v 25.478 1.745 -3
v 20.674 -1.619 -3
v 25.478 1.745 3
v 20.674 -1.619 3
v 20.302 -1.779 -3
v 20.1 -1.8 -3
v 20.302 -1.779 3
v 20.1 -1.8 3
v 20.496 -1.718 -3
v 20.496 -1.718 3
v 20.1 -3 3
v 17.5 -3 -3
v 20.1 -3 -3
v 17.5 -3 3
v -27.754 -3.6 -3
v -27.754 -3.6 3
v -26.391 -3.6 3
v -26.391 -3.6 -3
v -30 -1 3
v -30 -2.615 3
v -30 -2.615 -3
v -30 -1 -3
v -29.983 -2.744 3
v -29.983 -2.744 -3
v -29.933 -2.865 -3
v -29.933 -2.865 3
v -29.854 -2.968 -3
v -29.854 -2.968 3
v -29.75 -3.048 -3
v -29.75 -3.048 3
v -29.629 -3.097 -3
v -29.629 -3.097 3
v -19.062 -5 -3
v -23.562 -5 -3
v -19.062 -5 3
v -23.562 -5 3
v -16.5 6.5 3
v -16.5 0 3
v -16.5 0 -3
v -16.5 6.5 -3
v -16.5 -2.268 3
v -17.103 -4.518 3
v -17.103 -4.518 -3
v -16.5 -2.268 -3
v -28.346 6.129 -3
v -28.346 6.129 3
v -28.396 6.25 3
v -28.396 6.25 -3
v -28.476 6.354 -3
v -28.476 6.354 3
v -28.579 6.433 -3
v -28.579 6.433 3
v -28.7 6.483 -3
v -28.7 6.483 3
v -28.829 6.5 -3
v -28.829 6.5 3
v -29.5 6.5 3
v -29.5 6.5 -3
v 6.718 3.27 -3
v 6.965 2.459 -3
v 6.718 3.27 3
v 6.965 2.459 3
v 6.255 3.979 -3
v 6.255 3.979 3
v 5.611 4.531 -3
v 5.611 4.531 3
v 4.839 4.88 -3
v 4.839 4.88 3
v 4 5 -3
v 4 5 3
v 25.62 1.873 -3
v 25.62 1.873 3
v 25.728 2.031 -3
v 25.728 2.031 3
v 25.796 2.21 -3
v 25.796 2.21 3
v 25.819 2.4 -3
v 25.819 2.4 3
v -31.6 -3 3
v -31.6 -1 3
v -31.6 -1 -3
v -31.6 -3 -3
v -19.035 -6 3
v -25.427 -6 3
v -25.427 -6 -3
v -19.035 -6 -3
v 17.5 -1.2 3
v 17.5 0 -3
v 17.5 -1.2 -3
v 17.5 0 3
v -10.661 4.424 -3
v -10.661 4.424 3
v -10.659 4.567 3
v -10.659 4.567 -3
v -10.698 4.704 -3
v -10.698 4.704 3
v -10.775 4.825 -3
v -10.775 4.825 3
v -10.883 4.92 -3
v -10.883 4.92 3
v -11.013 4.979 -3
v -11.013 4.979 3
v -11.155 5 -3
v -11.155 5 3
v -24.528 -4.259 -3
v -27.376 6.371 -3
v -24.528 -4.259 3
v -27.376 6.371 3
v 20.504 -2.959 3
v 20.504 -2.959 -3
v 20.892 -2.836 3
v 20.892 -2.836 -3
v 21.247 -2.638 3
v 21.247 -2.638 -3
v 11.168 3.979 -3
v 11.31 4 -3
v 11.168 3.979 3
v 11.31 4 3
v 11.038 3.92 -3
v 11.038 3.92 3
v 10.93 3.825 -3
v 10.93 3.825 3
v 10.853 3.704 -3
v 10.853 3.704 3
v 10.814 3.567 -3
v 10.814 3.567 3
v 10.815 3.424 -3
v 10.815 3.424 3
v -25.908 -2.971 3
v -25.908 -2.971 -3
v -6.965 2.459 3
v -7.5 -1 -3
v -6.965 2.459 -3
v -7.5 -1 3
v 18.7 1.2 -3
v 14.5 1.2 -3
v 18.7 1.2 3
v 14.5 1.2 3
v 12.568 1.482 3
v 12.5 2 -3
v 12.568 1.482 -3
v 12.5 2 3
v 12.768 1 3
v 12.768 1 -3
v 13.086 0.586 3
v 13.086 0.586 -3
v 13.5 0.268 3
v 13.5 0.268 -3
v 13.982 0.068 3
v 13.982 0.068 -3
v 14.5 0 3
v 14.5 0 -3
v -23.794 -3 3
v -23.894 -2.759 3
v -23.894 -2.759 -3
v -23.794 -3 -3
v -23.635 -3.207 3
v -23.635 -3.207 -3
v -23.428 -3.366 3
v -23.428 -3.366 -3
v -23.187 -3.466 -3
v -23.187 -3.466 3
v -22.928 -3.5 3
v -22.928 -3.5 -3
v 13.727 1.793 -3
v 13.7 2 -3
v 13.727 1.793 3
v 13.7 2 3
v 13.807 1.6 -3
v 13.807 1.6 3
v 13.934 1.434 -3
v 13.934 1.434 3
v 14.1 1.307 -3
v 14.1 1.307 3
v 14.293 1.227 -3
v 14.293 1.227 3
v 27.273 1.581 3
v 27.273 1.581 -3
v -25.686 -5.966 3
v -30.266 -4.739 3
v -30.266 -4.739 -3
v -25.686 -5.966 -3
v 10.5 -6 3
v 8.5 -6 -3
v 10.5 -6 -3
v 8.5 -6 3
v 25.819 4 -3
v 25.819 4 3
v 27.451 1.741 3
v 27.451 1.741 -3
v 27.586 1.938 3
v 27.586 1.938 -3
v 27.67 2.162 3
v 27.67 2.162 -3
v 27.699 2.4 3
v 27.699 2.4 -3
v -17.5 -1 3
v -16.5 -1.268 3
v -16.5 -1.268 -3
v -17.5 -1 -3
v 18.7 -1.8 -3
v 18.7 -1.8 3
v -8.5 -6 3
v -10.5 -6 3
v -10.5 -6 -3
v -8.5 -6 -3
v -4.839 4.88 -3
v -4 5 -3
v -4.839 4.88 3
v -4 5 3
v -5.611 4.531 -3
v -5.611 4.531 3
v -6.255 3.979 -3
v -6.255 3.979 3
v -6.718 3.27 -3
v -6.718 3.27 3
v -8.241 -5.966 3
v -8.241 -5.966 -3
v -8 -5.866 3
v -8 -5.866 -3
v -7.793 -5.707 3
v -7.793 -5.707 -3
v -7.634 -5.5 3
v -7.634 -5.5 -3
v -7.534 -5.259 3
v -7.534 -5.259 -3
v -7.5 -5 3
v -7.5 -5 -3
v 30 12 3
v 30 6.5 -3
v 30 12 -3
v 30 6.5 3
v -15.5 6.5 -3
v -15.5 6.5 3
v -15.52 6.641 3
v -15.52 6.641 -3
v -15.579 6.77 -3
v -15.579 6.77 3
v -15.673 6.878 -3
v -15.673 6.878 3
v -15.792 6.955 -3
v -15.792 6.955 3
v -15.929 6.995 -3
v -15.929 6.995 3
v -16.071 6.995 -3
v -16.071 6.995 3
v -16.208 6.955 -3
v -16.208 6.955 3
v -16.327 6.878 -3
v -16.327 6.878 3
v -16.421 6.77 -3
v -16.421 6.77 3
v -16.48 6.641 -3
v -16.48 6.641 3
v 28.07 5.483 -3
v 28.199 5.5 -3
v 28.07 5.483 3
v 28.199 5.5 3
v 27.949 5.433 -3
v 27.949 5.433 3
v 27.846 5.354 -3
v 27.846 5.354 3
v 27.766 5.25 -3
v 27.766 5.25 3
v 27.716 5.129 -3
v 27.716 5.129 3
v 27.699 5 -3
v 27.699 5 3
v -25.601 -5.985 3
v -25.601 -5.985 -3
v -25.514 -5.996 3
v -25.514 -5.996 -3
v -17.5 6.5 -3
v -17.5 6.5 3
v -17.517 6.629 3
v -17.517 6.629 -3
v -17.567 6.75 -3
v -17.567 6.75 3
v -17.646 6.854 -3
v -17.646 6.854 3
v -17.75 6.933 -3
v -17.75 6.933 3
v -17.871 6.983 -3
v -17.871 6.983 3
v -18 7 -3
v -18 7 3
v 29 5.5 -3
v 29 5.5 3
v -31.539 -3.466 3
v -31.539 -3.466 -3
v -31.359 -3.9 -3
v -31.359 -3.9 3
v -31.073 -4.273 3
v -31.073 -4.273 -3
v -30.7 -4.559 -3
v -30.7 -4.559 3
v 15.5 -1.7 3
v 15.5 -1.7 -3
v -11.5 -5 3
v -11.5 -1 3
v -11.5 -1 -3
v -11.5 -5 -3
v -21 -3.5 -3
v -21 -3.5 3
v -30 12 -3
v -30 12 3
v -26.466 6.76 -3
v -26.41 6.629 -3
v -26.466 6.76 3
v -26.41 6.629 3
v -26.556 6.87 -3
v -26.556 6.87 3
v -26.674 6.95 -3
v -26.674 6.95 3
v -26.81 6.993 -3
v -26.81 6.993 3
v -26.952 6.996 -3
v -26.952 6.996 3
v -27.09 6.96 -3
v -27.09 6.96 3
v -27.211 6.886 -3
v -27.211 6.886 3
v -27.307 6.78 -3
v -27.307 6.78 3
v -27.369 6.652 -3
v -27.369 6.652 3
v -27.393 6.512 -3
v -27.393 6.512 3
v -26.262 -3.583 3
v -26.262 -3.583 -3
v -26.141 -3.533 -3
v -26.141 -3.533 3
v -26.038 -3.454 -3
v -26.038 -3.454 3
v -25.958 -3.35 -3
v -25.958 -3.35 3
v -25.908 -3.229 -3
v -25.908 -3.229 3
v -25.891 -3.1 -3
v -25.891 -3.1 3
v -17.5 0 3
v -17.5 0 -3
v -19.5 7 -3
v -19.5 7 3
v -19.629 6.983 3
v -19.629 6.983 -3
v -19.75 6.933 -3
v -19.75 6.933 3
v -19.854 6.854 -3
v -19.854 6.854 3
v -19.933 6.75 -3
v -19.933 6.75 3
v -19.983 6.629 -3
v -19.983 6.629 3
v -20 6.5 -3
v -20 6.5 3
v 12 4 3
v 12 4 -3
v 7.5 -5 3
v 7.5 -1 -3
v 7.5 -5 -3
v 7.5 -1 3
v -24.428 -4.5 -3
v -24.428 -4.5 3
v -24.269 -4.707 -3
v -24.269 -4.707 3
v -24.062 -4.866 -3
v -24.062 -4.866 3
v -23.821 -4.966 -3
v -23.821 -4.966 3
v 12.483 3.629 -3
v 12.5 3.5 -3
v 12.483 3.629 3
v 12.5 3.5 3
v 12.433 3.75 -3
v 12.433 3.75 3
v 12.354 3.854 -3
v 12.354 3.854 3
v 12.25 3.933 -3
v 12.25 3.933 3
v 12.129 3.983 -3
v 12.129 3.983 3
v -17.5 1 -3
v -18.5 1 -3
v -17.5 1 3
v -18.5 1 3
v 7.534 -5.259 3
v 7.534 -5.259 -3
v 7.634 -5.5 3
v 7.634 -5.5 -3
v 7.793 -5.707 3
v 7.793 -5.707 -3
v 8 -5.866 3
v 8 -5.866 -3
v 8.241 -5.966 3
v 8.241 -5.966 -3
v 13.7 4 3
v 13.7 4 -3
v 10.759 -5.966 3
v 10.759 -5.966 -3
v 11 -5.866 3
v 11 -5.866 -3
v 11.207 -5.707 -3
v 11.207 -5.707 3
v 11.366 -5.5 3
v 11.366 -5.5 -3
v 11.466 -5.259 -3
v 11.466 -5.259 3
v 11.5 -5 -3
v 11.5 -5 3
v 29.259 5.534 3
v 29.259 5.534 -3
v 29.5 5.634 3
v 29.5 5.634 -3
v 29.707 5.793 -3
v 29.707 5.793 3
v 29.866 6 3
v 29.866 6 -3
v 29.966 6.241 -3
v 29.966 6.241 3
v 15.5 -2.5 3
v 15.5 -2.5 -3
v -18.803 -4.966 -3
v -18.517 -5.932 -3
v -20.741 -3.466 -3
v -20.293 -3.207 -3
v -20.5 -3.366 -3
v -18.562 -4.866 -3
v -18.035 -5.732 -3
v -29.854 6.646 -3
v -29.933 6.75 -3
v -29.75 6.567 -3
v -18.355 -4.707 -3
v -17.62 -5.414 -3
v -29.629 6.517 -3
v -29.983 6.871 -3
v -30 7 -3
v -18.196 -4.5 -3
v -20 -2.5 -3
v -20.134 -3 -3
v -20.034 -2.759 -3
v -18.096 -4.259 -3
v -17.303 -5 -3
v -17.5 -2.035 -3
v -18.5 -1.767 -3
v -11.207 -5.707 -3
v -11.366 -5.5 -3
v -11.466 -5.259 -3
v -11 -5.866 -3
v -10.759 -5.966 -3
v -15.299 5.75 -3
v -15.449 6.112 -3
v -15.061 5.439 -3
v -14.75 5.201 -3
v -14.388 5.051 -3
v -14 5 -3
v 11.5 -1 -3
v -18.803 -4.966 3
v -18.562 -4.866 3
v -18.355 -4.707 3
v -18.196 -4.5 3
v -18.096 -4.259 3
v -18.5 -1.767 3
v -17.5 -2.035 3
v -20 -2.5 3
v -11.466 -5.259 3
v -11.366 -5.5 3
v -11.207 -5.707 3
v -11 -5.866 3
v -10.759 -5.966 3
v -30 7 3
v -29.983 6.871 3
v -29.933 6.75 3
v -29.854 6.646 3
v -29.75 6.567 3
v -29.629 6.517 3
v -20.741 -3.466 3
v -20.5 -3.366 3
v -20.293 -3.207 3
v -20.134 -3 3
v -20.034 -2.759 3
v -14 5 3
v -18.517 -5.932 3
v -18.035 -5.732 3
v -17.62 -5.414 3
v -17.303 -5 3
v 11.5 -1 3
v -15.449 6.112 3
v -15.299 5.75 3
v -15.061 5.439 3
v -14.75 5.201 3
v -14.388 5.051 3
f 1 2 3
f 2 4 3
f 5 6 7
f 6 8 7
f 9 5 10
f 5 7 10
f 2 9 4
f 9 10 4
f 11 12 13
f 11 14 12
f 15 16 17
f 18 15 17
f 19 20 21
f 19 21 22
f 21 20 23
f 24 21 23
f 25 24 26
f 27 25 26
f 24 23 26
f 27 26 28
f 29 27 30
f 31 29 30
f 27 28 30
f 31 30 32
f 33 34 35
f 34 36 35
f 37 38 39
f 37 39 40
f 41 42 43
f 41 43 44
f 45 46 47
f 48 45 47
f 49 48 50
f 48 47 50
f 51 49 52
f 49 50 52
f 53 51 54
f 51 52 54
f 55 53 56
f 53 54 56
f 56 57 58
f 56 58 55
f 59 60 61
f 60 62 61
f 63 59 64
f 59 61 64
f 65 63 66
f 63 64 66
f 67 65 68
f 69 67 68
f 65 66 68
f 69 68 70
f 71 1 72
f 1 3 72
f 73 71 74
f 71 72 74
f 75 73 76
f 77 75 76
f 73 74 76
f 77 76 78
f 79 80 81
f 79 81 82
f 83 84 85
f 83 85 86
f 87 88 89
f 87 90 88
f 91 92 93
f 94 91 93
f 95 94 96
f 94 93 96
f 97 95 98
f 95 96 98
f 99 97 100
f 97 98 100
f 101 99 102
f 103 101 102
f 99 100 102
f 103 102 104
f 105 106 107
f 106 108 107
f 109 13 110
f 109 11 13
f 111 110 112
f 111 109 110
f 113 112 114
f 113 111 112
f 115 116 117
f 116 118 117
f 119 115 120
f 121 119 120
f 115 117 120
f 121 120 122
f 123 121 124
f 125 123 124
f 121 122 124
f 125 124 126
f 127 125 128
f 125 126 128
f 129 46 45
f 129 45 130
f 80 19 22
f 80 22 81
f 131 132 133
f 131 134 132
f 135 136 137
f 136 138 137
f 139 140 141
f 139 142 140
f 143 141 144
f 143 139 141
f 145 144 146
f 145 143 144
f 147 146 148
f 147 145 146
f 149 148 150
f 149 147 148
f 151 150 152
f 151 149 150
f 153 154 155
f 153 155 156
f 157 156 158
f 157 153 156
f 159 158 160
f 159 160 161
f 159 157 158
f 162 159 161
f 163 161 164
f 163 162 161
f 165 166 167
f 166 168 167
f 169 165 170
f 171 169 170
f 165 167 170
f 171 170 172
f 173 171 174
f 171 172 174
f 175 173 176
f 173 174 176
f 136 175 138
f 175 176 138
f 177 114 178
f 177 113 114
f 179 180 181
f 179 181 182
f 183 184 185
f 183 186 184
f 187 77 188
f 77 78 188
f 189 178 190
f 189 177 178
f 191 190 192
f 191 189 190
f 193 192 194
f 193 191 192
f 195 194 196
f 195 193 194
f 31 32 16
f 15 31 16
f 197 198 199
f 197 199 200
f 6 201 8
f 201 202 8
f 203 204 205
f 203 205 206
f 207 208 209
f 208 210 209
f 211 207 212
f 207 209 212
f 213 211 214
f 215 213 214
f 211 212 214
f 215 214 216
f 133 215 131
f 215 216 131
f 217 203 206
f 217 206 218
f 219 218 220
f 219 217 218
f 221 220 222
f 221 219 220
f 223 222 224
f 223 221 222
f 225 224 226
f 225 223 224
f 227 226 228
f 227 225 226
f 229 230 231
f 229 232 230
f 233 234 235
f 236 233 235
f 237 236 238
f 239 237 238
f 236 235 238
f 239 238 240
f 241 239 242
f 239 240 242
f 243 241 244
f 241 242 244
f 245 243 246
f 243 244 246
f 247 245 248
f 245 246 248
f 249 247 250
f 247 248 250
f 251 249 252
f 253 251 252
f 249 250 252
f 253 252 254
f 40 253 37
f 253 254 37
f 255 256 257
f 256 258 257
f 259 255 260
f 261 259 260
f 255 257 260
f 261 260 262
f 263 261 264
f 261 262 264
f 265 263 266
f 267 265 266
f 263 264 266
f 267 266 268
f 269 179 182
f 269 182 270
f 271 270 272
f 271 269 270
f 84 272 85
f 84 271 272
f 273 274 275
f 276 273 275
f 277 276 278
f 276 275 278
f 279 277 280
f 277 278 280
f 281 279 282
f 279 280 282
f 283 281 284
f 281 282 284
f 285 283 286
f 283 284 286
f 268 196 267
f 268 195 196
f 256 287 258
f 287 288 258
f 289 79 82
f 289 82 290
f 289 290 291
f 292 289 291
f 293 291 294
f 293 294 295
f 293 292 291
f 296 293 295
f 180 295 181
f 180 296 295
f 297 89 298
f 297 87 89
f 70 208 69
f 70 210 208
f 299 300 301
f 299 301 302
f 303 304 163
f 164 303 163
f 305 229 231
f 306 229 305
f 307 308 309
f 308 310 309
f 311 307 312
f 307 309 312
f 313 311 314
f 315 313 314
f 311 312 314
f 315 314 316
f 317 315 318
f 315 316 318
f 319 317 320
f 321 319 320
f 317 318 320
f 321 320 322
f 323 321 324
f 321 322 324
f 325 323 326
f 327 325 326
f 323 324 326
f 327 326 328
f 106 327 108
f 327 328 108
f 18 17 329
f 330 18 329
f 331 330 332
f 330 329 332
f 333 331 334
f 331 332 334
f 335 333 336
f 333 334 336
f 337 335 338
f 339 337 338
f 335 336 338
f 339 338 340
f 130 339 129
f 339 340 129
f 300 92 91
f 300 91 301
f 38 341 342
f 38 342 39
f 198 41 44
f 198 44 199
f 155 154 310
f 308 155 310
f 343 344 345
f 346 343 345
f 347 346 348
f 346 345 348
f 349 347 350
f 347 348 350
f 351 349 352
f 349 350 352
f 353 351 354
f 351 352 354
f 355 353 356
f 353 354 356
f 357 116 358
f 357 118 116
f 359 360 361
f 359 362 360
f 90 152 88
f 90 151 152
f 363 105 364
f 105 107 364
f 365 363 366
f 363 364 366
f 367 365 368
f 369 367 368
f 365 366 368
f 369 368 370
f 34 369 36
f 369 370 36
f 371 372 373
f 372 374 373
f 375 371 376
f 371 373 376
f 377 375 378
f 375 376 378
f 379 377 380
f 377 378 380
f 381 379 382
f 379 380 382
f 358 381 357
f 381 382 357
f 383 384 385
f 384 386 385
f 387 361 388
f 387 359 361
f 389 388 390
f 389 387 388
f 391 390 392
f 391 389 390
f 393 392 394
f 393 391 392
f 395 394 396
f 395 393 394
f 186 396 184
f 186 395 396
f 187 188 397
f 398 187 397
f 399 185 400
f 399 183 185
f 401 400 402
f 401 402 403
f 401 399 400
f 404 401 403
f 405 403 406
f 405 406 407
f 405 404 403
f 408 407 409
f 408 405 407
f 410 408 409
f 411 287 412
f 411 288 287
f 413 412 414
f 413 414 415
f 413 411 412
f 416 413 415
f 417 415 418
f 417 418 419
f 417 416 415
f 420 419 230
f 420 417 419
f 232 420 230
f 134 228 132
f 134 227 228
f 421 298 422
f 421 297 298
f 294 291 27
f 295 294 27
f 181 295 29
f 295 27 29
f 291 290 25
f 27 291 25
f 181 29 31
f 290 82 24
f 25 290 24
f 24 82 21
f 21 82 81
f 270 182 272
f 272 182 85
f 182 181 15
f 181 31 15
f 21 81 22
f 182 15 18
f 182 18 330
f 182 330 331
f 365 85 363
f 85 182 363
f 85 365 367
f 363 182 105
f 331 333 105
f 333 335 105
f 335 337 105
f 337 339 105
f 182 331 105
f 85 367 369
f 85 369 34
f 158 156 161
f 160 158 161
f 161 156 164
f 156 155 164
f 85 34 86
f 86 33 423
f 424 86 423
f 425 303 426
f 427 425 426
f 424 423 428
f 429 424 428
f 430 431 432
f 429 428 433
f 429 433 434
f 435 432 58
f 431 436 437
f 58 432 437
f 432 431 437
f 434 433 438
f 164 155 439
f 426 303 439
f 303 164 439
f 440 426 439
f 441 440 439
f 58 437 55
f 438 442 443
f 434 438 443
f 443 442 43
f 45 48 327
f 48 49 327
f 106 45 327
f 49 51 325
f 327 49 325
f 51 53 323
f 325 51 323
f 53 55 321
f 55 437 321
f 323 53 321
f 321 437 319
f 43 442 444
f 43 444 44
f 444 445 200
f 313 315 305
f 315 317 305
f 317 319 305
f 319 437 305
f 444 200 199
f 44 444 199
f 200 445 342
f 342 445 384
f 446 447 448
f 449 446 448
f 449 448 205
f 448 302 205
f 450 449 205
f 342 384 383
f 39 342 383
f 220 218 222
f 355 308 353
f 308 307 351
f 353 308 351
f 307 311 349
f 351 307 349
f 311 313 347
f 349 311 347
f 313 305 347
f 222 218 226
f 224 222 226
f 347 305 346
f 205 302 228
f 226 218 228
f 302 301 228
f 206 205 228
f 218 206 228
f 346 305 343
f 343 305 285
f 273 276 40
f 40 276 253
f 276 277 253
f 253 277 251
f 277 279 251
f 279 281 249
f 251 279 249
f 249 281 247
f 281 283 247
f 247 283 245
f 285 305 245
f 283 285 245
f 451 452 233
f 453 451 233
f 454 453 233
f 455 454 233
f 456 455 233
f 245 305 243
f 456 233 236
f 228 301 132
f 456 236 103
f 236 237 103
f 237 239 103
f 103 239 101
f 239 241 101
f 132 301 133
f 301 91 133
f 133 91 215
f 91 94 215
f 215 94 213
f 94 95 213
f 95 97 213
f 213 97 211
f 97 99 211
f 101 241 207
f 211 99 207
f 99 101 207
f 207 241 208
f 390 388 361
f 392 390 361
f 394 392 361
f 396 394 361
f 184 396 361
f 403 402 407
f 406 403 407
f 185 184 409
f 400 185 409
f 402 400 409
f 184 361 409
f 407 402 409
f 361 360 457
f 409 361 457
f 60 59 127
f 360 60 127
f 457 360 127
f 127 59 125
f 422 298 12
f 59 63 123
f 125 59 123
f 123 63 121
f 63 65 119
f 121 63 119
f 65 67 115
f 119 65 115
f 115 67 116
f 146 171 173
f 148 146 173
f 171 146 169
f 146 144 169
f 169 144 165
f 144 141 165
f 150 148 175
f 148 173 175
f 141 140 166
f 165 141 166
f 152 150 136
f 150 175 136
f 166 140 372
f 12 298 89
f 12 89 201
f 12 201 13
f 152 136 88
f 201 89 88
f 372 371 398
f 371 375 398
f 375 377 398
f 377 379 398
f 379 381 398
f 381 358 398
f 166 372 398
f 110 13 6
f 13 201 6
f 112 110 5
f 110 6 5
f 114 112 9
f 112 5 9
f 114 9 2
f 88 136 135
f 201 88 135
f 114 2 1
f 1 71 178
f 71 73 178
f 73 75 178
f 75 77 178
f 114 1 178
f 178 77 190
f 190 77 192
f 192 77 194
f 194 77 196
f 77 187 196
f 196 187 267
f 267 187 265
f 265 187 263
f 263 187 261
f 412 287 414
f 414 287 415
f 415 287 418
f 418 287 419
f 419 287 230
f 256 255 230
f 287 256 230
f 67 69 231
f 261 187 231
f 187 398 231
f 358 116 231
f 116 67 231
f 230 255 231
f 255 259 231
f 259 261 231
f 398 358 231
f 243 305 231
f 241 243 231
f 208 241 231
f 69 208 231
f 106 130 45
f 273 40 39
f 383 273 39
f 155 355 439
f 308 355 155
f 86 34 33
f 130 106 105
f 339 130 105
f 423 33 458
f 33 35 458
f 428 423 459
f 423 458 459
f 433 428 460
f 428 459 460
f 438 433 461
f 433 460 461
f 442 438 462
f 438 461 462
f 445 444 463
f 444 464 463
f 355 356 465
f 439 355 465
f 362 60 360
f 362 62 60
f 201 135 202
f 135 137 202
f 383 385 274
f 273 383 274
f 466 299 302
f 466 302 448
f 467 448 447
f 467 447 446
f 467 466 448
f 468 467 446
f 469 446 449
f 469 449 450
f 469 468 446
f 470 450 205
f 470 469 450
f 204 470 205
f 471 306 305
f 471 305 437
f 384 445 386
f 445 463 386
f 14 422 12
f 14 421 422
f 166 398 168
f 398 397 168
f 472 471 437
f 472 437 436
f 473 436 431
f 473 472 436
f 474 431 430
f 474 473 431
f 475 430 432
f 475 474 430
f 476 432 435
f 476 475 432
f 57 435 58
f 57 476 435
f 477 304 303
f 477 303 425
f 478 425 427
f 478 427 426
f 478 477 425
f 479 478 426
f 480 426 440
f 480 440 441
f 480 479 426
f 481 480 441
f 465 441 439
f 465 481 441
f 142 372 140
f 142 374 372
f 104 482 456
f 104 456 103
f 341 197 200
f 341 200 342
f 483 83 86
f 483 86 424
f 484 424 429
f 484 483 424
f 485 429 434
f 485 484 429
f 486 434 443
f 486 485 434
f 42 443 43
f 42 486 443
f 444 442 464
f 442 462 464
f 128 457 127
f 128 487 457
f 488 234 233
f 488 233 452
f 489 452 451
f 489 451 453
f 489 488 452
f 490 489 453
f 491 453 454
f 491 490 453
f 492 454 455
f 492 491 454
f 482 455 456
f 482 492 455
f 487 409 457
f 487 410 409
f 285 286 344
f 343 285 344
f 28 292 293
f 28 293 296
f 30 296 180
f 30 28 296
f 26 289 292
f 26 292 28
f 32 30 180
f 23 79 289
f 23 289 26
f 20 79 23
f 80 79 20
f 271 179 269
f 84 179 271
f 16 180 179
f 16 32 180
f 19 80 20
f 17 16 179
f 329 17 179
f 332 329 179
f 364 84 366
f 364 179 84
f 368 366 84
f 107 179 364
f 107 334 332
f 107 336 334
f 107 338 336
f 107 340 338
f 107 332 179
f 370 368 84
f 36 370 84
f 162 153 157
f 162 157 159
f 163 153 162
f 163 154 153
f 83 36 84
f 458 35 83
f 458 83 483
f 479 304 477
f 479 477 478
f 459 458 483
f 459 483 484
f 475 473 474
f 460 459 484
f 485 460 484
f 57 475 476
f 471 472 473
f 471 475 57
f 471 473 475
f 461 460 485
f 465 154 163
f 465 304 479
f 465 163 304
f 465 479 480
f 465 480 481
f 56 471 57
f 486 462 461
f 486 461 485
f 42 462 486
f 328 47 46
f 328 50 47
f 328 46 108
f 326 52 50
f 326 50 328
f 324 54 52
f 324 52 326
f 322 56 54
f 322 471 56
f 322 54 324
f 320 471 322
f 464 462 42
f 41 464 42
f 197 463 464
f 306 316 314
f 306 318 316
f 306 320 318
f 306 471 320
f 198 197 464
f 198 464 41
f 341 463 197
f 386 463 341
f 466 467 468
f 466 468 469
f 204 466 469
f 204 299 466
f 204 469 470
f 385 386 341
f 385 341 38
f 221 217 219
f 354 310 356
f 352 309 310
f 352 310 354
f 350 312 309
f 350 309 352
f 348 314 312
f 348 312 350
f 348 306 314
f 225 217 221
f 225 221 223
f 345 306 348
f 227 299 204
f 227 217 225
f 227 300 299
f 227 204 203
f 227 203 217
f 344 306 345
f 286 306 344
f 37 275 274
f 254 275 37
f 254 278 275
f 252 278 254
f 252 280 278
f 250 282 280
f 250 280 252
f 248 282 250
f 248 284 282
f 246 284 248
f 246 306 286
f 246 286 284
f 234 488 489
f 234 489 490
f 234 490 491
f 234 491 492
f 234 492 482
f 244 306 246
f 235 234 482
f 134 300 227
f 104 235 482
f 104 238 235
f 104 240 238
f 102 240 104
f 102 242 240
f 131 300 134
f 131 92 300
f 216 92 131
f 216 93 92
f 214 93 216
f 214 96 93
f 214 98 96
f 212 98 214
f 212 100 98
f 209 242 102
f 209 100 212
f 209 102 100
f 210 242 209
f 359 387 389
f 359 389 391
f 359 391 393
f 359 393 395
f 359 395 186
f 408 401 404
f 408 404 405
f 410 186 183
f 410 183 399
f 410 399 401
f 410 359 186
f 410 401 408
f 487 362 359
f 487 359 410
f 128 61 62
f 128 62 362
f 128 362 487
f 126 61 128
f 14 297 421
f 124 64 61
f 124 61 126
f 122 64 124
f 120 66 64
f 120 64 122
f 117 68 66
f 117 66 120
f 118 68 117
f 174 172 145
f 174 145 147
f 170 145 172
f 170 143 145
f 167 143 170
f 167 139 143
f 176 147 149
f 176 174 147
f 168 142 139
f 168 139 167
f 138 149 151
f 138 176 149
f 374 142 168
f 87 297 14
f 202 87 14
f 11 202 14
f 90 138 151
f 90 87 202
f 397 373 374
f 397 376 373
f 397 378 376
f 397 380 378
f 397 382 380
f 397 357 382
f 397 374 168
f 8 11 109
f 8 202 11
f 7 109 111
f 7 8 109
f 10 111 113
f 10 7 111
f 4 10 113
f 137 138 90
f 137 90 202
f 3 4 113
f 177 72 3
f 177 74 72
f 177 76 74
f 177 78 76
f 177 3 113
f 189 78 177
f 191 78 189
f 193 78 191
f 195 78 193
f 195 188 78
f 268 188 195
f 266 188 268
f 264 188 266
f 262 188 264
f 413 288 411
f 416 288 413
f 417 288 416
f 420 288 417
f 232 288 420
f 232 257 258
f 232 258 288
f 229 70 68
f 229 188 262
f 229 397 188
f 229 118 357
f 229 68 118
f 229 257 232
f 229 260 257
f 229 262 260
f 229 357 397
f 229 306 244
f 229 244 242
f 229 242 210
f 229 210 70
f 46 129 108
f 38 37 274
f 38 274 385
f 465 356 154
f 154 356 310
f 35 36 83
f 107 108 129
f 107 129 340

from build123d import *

# Parameters (mm, degrees)
PAD_DEPTH = 3


with BuildPart() as part:
    # Sketch → Pad (new body, symmetric)
    with BuildSketch(Plane.XY):
        with BuildLine():
            Line((30, 12), (-30, 12))
            Line((-30, 12), (-30, 7))
            ThreePointArc((-30, 7), (-29.853553, 6.646447), (-29.5, 6.5))
            Line((-29.5, 6.5), (-28.829405, 6.5))
            ThreePointArc((-28.346442, 6.12941), (-28.525024, 6.396677), (-28.829405, 6.5))
            Line((-28.346442, 6.12941), (-25.908104, -2.97059))
            ThreePointArc((-26.391067, -3.6), (-25.99439, -3.404381), (-25.908104, -2.97059))
            Line((-27.753955, -3.6), (-26.391067, -3.6))
            Line((-29.62941, -3.097473), (-27.753955, -3.6))
            ThreePointArc((-30, -2.61451), (-29.896677, -2.918891), (-29.62941, -3.097473))
            Line((-30, -2.61451), (-30, -1))
            Line((-30, -1), (-31.6, -1))
            Line((-31.6, -1), (-31.6, -3))
            ThreePointArc((-31.6, -3), (-31.228036, -4.095771), (-30.265874, -4.738666))
            Line((-30.265874, -4.738666), (-25.68568, -5.965926))
            ThreePointArc((-25.68568, -5.965926), (-25.557387, -5.991445), (-25.426861, -6))
            Line((-25.426861, -6), (-19.034654, -6))
            ThreePointArc((-19.034654, -6), (-17.817131, -5.586707), (-17.102802, -4.517638))
            Line((-17.102802, -4.517638), (-16.5, -2.267949))
            Line((-16.5, -2.267949), (-16.5, -1.267949))
            Line((-16.5, -1.267949), (-17.5, -1))
            Line((-17.5, -1), (-17.5, 0))
            Line((-17.5, 0), (-16.5, 0))
            Line((-16.5, 0), (-16.5, 6.5))
            ThreePointArc((-15.5, 6.5), (-16, 7), (-16.5, 6.5))
            ThreePointArc((-15.5, 6.5), (-15.06066, 5.43934), (-14, 5))
            Line((-14, 5), (-11.154762, 5))
            ThreePointArc((-10.660644, 4.423529), (-10.775134, 4.825396), (-11.154762, 5))
            Line((-10.660644, 4.423529), (-11.5, -1))
            Line((-11.5, -1), (-11.5, -5))
            ThreePointArc((-11.5, -5), (-11.207107, -5.707107), (-10.5, -6))
            Line((-10.5, -6), (-8.5, -6))
            ThreePointArc((-8.5, -6), (-7.792893, -5.707107), (-7.5, -5))
            Line((-7.5, -5), (-7.5, -1))
            Line((-7.5, -1), (-6.964706, 2.458824))
            ThreePointArc((-4, 5), (-5.952374, 4.27777), (-6.964706, 2.458824))
            Line((-4, 5), (4, 5))
            ThreePointArc((6.964706, 2.458824), (5.952374, 4.27777), (4, 5))
            Line((6.964706, 2.458824), (7.5, -1))
            Line((7.5, -1), (7.5, -5))
            ThreePointArc((7.5, -5), (7.792893, -5.707107), (8.5, -6))
            Line((8.5, -6), (10.5, -6))
            ThreePointArc((10.5, -6), (11.207107, -5.707107), (11.5, -5))
            Line((11.5, -5), (11.5, -1))
            Line((11.5, -1), (10.815406, 3.423529))
            ThreePointArc((11.309524, 4), (10.929896, 3.825396), (10.815406, 3.423529))
            Line((11.309524, 4), (12, 4))
            ThreePointArc((12.5, 3.5), (12.353553, 3.853553), (12, 4))
            Line((12.5, 3.5), (12.5, 2))
            ThreePointArc((12.5, 2), (13.085786, 0.585786), (14.5, 0))
            Line((14.5, 0), (17.5, 0))
            Line((17.5, 0), (17.5, -1.2))
            Line((17.5, -1.2), (15.5, -1.7))
            Line((15.5, -1.7), (15.5, -2.5))
            Line((15.5, -2.5), (17.5, -3))
            Line((17.5, -3), (20.1, -3))
            ThreePointArc((20.1, -3), (20.701412, -2.907434), (21.247153, -2.638304))
            Line((21.247153, -2.638304), (27.272726, 1.580848))
            ThreePointArc((27.272726, 1.580848), (27.586161, 1.938251), (27.69915, 2.4))
            Line((27.69915, 2.4), (27.69915, 5))
            ThreePointArc((28.19915, 5.5), (27.845597, 5.353553), (27.69915, 5))
            Line((29, 5.5), (28.19915, 5.5))
            ThreePointArc((29, 5.5), (29.707107, 5.792893), (30, 6.5))
            Line((30, 6.5), (30, 12))
        make_face()
        with BuildLine():
            Line((-23.894296, -2.758819), (-26.409864, 6.62941))
            ThreePointArc((-26.409864, 6.62941), (-27.022236, 6.982963), (-27.37579, 6.37059))
            Line((-27.37579, 6.37059), (-24.527648, -4.258819))
            ThreePointArc((-24.527648, -4.258819), (-24.170484, -4.793353), (-23.561722, -5))
            Line((-23.561722, -5), (-19.061722, -5))
            ThreePointArc((-19.061722, -5), (-18.452961, -4.793353), (-18.095797, -4.258819))
            Line((-18.095797, -4.258819), (-17.5, -2.035276))
            Line((-17.5, -2.035276), (-18.5, -1.767327))
            Line((-18.5, -1.767327), (-18.5, 1))
            Line((-18.5, 1), (-17.5, 1))
            Line((-17.5, 1), (-17.5, 6.5))
            ThreePointArc((-17.5, 6.5), (-17.646447, 6.853553), (-18, 7))
            Line((-18, 7), (-19.5, 7))
            ThreePointArc((-19.5, 7), (-19.853553, 6.853553), (-20, 6.5))
            Line((-20, 6.5), (-20, -2.5))
            ThreePointArc((-21, -3.5), (-20.292893, -3.207107), (-20, -2.5))
            Line((-21, -3.5), (-22.92837, -3.5))
            ThreePointArc((-23.894296, -2.758819), (-23.537131, -3.293353), (-22.92837, -3.5))
        make_face(mode=Mode.SUBTRACT)
        with BuildLine():
            Line((25.818763, 4), (13.7, 4))
            Line((13.7, 4), (13.7, 2))
            ThreePointArc((13.7, 2), (13.934315, 1.434315), (14.5, 1.2))
            Line((14.5, 1.2), (18.7, 1.2))
            Line((18.7, 1.2), (18.7, -1.8))
            Line((18.7, -1.8), (20.1, -1.8))
            ThreePointArc((20.1, -1.8), (20.400706, -1.753717), (20.673576, -1.619152))
            Line((20.673576, -1.619152), (25.477624, 1.744678))
            ThreePointArc((25.477624, 1.744678), (25.728372, 2.030601), (25.818763, 2.4))
            Line((25.818763, 2.4), (25.818763, 4))
        make_face(mode=Mode.SUBTRACT)
    extrude(amount=PAD_DEPTH, both=True)


solid = part.part
